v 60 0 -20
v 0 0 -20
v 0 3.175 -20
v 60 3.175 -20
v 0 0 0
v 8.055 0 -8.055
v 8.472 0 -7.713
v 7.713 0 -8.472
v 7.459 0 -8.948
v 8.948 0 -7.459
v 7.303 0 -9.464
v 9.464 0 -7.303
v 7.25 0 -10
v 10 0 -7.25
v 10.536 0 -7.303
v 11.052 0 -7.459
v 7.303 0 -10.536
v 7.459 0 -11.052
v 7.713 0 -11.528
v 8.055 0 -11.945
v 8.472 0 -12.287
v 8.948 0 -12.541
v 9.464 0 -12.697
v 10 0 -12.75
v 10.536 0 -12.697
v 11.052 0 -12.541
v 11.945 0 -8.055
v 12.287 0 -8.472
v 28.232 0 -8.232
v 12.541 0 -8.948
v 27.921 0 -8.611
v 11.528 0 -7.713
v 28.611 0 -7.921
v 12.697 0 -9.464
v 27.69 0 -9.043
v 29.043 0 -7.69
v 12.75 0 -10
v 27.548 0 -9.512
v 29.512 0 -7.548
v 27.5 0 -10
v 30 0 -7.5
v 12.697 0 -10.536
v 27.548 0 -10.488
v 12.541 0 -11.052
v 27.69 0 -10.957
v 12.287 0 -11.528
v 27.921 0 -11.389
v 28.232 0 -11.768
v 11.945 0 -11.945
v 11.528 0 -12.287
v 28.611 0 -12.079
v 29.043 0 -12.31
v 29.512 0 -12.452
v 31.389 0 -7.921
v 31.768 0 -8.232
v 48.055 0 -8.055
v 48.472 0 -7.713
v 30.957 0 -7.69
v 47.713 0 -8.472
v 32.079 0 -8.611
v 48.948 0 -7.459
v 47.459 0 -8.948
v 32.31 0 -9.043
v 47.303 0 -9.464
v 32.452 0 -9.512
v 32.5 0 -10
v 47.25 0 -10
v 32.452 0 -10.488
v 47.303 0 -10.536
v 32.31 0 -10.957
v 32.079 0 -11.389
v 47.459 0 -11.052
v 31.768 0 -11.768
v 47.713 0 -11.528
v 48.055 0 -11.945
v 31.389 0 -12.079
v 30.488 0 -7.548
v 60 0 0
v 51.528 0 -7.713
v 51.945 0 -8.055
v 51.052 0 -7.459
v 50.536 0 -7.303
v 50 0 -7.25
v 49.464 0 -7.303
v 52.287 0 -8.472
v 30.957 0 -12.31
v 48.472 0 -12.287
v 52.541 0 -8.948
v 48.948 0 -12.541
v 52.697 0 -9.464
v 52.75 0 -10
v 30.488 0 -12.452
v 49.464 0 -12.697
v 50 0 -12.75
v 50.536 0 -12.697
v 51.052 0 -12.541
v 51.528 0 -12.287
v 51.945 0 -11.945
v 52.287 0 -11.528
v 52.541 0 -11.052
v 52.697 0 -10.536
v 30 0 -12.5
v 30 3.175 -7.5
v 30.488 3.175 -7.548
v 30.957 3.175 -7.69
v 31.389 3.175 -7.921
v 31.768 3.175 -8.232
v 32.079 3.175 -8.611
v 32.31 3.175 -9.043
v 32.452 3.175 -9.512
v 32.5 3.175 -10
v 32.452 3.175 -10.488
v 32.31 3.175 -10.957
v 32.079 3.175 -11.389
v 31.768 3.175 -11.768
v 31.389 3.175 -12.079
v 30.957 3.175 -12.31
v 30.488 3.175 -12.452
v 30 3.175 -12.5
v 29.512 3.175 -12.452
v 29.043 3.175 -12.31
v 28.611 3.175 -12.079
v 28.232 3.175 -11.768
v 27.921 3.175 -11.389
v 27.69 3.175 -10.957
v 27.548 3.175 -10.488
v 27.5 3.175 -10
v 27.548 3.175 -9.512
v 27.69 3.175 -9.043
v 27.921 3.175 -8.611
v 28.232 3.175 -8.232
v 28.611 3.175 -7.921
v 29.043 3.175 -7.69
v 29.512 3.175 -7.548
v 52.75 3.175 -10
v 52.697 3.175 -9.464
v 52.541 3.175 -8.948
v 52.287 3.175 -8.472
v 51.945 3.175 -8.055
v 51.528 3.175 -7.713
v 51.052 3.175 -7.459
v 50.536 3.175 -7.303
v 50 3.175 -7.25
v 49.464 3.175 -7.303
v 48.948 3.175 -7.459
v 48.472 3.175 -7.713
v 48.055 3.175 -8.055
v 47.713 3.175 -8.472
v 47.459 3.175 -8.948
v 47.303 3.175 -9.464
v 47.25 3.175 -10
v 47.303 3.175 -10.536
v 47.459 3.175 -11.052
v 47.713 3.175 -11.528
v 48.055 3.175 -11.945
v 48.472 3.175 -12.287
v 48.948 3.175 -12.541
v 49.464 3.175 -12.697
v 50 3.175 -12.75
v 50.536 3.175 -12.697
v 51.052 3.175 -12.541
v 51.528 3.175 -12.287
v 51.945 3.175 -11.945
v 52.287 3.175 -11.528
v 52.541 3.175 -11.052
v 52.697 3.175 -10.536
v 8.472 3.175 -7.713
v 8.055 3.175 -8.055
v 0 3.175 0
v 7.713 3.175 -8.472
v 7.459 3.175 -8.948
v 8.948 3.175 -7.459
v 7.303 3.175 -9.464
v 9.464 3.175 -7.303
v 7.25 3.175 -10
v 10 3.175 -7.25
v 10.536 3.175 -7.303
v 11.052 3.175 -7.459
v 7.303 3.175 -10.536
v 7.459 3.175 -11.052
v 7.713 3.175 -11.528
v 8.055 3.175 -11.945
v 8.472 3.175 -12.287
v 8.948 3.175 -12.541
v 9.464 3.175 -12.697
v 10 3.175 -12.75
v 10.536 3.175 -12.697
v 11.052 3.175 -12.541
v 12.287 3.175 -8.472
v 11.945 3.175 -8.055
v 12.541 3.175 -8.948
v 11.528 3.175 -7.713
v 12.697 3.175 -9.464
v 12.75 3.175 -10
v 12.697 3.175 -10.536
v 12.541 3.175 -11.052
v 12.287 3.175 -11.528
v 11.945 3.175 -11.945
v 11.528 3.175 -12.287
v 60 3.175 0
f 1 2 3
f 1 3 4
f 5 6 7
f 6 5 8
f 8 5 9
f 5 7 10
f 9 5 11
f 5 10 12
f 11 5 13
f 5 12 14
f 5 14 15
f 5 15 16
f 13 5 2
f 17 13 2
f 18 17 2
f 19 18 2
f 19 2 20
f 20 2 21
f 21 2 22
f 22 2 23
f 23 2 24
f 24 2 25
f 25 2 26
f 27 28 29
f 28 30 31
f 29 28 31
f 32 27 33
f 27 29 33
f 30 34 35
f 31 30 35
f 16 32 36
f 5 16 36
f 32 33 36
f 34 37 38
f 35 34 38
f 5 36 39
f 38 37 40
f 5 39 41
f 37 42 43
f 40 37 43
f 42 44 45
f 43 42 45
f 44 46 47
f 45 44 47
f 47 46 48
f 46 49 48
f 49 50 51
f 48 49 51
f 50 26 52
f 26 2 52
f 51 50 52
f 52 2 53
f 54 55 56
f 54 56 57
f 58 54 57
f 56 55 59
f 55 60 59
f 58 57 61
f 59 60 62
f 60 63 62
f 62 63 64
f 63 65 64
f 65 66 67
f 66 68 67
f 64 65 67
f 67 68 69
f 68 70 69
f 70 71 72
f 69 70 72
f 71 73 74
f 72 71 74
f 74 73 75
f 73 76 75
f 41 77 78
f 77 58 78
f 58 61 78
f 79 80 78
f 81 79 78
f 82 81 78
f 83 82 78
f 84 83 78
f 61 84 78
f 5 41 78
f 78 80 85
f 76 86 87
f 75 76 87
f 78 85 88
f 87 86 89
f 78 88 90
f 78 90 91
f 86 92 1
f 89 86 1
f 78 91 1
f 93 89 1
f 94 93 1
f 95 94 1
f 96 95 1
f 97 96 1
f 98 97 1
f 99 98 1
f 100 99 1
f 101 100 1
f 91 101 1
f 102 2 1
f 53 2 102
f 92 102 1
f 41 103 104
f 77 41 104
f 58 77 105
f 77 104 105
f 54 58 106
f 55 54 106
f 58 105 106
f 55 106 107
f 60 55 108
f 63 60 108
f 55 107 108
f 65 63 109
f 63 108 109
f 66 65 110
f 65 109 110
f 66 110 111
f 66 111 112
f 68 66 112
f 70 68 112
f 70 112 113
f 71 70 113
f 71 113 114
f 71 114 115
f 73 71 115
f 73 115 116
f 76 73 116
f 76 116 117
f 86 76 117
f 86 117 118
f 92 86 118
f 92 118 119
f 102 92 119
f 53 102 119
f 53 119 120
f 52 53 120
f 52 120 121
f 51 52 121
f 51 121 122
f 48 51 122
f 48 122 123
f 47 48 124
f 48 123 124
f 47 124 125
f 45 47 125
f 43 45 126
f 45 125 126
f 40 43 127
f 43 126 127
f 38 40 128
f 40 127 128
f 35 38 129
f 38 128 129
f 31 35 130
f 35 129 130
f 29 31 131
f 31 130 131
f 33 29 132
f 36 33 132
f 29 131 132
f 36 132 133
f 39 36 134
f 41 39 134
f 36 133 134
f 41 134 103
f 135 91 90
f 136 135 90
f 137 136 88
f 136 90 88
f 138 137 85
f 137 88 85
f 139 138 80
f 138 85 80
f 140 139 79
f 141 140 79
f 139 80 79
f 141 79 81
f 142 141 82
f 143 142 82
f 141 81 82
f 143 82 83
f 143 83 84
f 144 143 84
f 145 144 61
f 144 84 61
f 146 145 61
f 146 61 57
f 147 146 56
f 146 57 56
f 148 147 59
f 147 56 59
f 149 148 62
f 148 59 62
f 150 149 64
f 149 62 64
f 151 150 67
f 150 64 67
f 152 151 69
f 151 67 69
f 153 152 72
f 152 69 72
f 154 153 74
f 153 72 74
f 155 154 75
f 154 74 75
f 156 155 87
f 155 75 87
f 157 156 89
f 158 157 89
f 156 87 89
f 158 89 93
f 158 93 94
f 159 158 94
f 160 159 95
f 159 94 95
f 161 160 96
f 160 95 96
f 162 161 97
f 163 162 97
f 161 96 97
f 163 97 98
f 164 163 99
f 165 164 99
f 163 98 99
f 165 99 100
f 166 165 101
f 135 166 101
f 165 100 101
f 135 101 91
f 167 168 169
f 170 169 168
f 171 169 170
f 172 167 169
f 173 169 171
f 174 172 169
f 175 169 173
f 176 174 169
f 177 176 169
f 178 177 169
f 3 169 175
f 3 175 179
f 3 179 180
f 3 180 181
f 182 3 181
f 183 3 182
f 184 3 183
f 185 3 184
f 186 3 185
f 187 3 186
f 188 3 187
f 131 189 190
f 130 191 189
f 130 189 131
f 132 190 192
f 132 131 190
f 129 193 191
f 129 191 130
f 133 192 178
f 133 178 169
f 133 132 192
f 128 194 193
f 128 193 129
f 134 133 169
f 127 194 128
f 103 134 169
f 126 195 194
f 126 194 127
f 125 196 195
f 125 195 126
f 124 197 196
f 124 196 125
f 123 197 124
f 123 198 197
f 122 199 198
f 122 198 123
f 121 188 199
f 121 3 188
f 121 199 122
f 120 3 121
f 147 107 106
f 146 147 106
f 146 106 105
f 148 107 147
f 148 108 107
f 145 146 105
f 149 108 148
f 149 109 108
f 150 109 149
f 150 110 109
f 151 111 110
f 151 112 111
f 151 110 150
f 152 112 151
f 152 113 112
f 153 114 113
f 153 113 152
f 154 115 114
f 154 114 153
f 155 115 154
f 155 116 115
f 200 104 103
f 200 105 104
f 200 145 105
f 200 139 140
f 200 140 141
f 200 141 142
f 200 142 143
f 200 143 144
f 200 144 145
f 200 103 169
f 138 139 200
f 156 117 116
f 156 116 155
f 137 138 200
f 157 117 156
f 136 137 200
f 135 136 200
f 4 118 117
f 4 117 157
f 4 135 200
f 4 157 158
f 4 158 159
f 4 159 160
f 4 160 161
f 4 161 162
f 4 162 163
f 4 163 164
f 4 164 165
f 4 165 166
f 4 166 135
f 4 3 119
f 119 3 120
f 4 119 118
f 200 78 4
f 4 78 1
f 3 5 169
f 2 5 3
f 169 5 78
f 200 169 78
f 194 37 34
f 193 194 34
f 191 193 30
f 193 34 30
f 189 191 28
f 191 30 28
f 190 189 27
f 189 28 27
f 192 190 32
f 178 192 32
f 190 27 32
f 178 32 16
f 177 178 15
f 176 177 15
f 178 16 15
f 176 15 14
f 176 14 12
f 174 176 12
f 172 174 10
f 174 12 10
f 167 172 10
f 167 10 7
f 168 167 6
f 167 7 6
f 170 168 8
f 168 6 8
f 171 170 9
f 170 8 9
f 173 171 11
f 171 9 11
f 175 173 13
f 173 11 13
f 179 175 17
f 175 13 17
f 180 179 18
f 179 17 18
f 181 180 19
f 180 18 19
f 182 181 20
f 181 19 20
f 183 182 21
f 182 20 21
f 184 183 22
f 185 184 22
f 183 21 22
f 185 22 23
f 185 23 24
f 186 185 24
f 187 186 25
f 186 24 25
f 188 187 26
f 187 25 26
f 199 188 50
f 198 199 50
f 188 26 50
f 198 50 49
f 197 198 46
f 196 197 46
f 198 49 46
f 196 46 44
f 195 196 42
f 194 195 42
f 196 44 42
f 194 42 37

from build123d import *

# Parameters (mm, degrees)
SKETCH1_W             = 60
SKETCH1_H             = 20
BOSS_EXTRUDE1_DEPTH   = 3.175
SKETCH4_R             = 2.75
CUT_EXTRUDE1_DEPTH    = 3.175
M6X1_0_TAPPED_HOLE1_D = 5


with BuildPart() as part:
    # Sketch1 → Boss-Extrude1 (new body)
    with BuildSketch(Plane(origin=(0, 0, 0), x_dir=(1, 0, 0), z_dir=(0, 1, 0))):
        with Locations((30, 10)):
            Rectangle(SKETCH1_W, SKETCH1_H)
    extrude(amount=BOSS_EXTRUDE1_DEPTH)

    # Sketch4 → Cut-Extrude1 (cut)
    with BuildSketch(Plane.XZ):
        with Locations((50, -10)):
            Circle(SKETCH4_R)
        with Locations((10, -10)):
            Circle(SKETCH4_R)
    extrude(amount=-CUT_EXTRUDE1_DEPTH, mode=Mode.SUBTRACT)

    # M6x1.0 Tapped Hole1 (through all)
    with Locations(Plane(origin=(30, 0, -10), x_dir=(0, 0, -1), z_dir=(0, -1, 0))):
        with Locations((0, 0)):
            Hole(M6X1_0_TAPPED_HOLE1_D / 2)


solid = part.part
